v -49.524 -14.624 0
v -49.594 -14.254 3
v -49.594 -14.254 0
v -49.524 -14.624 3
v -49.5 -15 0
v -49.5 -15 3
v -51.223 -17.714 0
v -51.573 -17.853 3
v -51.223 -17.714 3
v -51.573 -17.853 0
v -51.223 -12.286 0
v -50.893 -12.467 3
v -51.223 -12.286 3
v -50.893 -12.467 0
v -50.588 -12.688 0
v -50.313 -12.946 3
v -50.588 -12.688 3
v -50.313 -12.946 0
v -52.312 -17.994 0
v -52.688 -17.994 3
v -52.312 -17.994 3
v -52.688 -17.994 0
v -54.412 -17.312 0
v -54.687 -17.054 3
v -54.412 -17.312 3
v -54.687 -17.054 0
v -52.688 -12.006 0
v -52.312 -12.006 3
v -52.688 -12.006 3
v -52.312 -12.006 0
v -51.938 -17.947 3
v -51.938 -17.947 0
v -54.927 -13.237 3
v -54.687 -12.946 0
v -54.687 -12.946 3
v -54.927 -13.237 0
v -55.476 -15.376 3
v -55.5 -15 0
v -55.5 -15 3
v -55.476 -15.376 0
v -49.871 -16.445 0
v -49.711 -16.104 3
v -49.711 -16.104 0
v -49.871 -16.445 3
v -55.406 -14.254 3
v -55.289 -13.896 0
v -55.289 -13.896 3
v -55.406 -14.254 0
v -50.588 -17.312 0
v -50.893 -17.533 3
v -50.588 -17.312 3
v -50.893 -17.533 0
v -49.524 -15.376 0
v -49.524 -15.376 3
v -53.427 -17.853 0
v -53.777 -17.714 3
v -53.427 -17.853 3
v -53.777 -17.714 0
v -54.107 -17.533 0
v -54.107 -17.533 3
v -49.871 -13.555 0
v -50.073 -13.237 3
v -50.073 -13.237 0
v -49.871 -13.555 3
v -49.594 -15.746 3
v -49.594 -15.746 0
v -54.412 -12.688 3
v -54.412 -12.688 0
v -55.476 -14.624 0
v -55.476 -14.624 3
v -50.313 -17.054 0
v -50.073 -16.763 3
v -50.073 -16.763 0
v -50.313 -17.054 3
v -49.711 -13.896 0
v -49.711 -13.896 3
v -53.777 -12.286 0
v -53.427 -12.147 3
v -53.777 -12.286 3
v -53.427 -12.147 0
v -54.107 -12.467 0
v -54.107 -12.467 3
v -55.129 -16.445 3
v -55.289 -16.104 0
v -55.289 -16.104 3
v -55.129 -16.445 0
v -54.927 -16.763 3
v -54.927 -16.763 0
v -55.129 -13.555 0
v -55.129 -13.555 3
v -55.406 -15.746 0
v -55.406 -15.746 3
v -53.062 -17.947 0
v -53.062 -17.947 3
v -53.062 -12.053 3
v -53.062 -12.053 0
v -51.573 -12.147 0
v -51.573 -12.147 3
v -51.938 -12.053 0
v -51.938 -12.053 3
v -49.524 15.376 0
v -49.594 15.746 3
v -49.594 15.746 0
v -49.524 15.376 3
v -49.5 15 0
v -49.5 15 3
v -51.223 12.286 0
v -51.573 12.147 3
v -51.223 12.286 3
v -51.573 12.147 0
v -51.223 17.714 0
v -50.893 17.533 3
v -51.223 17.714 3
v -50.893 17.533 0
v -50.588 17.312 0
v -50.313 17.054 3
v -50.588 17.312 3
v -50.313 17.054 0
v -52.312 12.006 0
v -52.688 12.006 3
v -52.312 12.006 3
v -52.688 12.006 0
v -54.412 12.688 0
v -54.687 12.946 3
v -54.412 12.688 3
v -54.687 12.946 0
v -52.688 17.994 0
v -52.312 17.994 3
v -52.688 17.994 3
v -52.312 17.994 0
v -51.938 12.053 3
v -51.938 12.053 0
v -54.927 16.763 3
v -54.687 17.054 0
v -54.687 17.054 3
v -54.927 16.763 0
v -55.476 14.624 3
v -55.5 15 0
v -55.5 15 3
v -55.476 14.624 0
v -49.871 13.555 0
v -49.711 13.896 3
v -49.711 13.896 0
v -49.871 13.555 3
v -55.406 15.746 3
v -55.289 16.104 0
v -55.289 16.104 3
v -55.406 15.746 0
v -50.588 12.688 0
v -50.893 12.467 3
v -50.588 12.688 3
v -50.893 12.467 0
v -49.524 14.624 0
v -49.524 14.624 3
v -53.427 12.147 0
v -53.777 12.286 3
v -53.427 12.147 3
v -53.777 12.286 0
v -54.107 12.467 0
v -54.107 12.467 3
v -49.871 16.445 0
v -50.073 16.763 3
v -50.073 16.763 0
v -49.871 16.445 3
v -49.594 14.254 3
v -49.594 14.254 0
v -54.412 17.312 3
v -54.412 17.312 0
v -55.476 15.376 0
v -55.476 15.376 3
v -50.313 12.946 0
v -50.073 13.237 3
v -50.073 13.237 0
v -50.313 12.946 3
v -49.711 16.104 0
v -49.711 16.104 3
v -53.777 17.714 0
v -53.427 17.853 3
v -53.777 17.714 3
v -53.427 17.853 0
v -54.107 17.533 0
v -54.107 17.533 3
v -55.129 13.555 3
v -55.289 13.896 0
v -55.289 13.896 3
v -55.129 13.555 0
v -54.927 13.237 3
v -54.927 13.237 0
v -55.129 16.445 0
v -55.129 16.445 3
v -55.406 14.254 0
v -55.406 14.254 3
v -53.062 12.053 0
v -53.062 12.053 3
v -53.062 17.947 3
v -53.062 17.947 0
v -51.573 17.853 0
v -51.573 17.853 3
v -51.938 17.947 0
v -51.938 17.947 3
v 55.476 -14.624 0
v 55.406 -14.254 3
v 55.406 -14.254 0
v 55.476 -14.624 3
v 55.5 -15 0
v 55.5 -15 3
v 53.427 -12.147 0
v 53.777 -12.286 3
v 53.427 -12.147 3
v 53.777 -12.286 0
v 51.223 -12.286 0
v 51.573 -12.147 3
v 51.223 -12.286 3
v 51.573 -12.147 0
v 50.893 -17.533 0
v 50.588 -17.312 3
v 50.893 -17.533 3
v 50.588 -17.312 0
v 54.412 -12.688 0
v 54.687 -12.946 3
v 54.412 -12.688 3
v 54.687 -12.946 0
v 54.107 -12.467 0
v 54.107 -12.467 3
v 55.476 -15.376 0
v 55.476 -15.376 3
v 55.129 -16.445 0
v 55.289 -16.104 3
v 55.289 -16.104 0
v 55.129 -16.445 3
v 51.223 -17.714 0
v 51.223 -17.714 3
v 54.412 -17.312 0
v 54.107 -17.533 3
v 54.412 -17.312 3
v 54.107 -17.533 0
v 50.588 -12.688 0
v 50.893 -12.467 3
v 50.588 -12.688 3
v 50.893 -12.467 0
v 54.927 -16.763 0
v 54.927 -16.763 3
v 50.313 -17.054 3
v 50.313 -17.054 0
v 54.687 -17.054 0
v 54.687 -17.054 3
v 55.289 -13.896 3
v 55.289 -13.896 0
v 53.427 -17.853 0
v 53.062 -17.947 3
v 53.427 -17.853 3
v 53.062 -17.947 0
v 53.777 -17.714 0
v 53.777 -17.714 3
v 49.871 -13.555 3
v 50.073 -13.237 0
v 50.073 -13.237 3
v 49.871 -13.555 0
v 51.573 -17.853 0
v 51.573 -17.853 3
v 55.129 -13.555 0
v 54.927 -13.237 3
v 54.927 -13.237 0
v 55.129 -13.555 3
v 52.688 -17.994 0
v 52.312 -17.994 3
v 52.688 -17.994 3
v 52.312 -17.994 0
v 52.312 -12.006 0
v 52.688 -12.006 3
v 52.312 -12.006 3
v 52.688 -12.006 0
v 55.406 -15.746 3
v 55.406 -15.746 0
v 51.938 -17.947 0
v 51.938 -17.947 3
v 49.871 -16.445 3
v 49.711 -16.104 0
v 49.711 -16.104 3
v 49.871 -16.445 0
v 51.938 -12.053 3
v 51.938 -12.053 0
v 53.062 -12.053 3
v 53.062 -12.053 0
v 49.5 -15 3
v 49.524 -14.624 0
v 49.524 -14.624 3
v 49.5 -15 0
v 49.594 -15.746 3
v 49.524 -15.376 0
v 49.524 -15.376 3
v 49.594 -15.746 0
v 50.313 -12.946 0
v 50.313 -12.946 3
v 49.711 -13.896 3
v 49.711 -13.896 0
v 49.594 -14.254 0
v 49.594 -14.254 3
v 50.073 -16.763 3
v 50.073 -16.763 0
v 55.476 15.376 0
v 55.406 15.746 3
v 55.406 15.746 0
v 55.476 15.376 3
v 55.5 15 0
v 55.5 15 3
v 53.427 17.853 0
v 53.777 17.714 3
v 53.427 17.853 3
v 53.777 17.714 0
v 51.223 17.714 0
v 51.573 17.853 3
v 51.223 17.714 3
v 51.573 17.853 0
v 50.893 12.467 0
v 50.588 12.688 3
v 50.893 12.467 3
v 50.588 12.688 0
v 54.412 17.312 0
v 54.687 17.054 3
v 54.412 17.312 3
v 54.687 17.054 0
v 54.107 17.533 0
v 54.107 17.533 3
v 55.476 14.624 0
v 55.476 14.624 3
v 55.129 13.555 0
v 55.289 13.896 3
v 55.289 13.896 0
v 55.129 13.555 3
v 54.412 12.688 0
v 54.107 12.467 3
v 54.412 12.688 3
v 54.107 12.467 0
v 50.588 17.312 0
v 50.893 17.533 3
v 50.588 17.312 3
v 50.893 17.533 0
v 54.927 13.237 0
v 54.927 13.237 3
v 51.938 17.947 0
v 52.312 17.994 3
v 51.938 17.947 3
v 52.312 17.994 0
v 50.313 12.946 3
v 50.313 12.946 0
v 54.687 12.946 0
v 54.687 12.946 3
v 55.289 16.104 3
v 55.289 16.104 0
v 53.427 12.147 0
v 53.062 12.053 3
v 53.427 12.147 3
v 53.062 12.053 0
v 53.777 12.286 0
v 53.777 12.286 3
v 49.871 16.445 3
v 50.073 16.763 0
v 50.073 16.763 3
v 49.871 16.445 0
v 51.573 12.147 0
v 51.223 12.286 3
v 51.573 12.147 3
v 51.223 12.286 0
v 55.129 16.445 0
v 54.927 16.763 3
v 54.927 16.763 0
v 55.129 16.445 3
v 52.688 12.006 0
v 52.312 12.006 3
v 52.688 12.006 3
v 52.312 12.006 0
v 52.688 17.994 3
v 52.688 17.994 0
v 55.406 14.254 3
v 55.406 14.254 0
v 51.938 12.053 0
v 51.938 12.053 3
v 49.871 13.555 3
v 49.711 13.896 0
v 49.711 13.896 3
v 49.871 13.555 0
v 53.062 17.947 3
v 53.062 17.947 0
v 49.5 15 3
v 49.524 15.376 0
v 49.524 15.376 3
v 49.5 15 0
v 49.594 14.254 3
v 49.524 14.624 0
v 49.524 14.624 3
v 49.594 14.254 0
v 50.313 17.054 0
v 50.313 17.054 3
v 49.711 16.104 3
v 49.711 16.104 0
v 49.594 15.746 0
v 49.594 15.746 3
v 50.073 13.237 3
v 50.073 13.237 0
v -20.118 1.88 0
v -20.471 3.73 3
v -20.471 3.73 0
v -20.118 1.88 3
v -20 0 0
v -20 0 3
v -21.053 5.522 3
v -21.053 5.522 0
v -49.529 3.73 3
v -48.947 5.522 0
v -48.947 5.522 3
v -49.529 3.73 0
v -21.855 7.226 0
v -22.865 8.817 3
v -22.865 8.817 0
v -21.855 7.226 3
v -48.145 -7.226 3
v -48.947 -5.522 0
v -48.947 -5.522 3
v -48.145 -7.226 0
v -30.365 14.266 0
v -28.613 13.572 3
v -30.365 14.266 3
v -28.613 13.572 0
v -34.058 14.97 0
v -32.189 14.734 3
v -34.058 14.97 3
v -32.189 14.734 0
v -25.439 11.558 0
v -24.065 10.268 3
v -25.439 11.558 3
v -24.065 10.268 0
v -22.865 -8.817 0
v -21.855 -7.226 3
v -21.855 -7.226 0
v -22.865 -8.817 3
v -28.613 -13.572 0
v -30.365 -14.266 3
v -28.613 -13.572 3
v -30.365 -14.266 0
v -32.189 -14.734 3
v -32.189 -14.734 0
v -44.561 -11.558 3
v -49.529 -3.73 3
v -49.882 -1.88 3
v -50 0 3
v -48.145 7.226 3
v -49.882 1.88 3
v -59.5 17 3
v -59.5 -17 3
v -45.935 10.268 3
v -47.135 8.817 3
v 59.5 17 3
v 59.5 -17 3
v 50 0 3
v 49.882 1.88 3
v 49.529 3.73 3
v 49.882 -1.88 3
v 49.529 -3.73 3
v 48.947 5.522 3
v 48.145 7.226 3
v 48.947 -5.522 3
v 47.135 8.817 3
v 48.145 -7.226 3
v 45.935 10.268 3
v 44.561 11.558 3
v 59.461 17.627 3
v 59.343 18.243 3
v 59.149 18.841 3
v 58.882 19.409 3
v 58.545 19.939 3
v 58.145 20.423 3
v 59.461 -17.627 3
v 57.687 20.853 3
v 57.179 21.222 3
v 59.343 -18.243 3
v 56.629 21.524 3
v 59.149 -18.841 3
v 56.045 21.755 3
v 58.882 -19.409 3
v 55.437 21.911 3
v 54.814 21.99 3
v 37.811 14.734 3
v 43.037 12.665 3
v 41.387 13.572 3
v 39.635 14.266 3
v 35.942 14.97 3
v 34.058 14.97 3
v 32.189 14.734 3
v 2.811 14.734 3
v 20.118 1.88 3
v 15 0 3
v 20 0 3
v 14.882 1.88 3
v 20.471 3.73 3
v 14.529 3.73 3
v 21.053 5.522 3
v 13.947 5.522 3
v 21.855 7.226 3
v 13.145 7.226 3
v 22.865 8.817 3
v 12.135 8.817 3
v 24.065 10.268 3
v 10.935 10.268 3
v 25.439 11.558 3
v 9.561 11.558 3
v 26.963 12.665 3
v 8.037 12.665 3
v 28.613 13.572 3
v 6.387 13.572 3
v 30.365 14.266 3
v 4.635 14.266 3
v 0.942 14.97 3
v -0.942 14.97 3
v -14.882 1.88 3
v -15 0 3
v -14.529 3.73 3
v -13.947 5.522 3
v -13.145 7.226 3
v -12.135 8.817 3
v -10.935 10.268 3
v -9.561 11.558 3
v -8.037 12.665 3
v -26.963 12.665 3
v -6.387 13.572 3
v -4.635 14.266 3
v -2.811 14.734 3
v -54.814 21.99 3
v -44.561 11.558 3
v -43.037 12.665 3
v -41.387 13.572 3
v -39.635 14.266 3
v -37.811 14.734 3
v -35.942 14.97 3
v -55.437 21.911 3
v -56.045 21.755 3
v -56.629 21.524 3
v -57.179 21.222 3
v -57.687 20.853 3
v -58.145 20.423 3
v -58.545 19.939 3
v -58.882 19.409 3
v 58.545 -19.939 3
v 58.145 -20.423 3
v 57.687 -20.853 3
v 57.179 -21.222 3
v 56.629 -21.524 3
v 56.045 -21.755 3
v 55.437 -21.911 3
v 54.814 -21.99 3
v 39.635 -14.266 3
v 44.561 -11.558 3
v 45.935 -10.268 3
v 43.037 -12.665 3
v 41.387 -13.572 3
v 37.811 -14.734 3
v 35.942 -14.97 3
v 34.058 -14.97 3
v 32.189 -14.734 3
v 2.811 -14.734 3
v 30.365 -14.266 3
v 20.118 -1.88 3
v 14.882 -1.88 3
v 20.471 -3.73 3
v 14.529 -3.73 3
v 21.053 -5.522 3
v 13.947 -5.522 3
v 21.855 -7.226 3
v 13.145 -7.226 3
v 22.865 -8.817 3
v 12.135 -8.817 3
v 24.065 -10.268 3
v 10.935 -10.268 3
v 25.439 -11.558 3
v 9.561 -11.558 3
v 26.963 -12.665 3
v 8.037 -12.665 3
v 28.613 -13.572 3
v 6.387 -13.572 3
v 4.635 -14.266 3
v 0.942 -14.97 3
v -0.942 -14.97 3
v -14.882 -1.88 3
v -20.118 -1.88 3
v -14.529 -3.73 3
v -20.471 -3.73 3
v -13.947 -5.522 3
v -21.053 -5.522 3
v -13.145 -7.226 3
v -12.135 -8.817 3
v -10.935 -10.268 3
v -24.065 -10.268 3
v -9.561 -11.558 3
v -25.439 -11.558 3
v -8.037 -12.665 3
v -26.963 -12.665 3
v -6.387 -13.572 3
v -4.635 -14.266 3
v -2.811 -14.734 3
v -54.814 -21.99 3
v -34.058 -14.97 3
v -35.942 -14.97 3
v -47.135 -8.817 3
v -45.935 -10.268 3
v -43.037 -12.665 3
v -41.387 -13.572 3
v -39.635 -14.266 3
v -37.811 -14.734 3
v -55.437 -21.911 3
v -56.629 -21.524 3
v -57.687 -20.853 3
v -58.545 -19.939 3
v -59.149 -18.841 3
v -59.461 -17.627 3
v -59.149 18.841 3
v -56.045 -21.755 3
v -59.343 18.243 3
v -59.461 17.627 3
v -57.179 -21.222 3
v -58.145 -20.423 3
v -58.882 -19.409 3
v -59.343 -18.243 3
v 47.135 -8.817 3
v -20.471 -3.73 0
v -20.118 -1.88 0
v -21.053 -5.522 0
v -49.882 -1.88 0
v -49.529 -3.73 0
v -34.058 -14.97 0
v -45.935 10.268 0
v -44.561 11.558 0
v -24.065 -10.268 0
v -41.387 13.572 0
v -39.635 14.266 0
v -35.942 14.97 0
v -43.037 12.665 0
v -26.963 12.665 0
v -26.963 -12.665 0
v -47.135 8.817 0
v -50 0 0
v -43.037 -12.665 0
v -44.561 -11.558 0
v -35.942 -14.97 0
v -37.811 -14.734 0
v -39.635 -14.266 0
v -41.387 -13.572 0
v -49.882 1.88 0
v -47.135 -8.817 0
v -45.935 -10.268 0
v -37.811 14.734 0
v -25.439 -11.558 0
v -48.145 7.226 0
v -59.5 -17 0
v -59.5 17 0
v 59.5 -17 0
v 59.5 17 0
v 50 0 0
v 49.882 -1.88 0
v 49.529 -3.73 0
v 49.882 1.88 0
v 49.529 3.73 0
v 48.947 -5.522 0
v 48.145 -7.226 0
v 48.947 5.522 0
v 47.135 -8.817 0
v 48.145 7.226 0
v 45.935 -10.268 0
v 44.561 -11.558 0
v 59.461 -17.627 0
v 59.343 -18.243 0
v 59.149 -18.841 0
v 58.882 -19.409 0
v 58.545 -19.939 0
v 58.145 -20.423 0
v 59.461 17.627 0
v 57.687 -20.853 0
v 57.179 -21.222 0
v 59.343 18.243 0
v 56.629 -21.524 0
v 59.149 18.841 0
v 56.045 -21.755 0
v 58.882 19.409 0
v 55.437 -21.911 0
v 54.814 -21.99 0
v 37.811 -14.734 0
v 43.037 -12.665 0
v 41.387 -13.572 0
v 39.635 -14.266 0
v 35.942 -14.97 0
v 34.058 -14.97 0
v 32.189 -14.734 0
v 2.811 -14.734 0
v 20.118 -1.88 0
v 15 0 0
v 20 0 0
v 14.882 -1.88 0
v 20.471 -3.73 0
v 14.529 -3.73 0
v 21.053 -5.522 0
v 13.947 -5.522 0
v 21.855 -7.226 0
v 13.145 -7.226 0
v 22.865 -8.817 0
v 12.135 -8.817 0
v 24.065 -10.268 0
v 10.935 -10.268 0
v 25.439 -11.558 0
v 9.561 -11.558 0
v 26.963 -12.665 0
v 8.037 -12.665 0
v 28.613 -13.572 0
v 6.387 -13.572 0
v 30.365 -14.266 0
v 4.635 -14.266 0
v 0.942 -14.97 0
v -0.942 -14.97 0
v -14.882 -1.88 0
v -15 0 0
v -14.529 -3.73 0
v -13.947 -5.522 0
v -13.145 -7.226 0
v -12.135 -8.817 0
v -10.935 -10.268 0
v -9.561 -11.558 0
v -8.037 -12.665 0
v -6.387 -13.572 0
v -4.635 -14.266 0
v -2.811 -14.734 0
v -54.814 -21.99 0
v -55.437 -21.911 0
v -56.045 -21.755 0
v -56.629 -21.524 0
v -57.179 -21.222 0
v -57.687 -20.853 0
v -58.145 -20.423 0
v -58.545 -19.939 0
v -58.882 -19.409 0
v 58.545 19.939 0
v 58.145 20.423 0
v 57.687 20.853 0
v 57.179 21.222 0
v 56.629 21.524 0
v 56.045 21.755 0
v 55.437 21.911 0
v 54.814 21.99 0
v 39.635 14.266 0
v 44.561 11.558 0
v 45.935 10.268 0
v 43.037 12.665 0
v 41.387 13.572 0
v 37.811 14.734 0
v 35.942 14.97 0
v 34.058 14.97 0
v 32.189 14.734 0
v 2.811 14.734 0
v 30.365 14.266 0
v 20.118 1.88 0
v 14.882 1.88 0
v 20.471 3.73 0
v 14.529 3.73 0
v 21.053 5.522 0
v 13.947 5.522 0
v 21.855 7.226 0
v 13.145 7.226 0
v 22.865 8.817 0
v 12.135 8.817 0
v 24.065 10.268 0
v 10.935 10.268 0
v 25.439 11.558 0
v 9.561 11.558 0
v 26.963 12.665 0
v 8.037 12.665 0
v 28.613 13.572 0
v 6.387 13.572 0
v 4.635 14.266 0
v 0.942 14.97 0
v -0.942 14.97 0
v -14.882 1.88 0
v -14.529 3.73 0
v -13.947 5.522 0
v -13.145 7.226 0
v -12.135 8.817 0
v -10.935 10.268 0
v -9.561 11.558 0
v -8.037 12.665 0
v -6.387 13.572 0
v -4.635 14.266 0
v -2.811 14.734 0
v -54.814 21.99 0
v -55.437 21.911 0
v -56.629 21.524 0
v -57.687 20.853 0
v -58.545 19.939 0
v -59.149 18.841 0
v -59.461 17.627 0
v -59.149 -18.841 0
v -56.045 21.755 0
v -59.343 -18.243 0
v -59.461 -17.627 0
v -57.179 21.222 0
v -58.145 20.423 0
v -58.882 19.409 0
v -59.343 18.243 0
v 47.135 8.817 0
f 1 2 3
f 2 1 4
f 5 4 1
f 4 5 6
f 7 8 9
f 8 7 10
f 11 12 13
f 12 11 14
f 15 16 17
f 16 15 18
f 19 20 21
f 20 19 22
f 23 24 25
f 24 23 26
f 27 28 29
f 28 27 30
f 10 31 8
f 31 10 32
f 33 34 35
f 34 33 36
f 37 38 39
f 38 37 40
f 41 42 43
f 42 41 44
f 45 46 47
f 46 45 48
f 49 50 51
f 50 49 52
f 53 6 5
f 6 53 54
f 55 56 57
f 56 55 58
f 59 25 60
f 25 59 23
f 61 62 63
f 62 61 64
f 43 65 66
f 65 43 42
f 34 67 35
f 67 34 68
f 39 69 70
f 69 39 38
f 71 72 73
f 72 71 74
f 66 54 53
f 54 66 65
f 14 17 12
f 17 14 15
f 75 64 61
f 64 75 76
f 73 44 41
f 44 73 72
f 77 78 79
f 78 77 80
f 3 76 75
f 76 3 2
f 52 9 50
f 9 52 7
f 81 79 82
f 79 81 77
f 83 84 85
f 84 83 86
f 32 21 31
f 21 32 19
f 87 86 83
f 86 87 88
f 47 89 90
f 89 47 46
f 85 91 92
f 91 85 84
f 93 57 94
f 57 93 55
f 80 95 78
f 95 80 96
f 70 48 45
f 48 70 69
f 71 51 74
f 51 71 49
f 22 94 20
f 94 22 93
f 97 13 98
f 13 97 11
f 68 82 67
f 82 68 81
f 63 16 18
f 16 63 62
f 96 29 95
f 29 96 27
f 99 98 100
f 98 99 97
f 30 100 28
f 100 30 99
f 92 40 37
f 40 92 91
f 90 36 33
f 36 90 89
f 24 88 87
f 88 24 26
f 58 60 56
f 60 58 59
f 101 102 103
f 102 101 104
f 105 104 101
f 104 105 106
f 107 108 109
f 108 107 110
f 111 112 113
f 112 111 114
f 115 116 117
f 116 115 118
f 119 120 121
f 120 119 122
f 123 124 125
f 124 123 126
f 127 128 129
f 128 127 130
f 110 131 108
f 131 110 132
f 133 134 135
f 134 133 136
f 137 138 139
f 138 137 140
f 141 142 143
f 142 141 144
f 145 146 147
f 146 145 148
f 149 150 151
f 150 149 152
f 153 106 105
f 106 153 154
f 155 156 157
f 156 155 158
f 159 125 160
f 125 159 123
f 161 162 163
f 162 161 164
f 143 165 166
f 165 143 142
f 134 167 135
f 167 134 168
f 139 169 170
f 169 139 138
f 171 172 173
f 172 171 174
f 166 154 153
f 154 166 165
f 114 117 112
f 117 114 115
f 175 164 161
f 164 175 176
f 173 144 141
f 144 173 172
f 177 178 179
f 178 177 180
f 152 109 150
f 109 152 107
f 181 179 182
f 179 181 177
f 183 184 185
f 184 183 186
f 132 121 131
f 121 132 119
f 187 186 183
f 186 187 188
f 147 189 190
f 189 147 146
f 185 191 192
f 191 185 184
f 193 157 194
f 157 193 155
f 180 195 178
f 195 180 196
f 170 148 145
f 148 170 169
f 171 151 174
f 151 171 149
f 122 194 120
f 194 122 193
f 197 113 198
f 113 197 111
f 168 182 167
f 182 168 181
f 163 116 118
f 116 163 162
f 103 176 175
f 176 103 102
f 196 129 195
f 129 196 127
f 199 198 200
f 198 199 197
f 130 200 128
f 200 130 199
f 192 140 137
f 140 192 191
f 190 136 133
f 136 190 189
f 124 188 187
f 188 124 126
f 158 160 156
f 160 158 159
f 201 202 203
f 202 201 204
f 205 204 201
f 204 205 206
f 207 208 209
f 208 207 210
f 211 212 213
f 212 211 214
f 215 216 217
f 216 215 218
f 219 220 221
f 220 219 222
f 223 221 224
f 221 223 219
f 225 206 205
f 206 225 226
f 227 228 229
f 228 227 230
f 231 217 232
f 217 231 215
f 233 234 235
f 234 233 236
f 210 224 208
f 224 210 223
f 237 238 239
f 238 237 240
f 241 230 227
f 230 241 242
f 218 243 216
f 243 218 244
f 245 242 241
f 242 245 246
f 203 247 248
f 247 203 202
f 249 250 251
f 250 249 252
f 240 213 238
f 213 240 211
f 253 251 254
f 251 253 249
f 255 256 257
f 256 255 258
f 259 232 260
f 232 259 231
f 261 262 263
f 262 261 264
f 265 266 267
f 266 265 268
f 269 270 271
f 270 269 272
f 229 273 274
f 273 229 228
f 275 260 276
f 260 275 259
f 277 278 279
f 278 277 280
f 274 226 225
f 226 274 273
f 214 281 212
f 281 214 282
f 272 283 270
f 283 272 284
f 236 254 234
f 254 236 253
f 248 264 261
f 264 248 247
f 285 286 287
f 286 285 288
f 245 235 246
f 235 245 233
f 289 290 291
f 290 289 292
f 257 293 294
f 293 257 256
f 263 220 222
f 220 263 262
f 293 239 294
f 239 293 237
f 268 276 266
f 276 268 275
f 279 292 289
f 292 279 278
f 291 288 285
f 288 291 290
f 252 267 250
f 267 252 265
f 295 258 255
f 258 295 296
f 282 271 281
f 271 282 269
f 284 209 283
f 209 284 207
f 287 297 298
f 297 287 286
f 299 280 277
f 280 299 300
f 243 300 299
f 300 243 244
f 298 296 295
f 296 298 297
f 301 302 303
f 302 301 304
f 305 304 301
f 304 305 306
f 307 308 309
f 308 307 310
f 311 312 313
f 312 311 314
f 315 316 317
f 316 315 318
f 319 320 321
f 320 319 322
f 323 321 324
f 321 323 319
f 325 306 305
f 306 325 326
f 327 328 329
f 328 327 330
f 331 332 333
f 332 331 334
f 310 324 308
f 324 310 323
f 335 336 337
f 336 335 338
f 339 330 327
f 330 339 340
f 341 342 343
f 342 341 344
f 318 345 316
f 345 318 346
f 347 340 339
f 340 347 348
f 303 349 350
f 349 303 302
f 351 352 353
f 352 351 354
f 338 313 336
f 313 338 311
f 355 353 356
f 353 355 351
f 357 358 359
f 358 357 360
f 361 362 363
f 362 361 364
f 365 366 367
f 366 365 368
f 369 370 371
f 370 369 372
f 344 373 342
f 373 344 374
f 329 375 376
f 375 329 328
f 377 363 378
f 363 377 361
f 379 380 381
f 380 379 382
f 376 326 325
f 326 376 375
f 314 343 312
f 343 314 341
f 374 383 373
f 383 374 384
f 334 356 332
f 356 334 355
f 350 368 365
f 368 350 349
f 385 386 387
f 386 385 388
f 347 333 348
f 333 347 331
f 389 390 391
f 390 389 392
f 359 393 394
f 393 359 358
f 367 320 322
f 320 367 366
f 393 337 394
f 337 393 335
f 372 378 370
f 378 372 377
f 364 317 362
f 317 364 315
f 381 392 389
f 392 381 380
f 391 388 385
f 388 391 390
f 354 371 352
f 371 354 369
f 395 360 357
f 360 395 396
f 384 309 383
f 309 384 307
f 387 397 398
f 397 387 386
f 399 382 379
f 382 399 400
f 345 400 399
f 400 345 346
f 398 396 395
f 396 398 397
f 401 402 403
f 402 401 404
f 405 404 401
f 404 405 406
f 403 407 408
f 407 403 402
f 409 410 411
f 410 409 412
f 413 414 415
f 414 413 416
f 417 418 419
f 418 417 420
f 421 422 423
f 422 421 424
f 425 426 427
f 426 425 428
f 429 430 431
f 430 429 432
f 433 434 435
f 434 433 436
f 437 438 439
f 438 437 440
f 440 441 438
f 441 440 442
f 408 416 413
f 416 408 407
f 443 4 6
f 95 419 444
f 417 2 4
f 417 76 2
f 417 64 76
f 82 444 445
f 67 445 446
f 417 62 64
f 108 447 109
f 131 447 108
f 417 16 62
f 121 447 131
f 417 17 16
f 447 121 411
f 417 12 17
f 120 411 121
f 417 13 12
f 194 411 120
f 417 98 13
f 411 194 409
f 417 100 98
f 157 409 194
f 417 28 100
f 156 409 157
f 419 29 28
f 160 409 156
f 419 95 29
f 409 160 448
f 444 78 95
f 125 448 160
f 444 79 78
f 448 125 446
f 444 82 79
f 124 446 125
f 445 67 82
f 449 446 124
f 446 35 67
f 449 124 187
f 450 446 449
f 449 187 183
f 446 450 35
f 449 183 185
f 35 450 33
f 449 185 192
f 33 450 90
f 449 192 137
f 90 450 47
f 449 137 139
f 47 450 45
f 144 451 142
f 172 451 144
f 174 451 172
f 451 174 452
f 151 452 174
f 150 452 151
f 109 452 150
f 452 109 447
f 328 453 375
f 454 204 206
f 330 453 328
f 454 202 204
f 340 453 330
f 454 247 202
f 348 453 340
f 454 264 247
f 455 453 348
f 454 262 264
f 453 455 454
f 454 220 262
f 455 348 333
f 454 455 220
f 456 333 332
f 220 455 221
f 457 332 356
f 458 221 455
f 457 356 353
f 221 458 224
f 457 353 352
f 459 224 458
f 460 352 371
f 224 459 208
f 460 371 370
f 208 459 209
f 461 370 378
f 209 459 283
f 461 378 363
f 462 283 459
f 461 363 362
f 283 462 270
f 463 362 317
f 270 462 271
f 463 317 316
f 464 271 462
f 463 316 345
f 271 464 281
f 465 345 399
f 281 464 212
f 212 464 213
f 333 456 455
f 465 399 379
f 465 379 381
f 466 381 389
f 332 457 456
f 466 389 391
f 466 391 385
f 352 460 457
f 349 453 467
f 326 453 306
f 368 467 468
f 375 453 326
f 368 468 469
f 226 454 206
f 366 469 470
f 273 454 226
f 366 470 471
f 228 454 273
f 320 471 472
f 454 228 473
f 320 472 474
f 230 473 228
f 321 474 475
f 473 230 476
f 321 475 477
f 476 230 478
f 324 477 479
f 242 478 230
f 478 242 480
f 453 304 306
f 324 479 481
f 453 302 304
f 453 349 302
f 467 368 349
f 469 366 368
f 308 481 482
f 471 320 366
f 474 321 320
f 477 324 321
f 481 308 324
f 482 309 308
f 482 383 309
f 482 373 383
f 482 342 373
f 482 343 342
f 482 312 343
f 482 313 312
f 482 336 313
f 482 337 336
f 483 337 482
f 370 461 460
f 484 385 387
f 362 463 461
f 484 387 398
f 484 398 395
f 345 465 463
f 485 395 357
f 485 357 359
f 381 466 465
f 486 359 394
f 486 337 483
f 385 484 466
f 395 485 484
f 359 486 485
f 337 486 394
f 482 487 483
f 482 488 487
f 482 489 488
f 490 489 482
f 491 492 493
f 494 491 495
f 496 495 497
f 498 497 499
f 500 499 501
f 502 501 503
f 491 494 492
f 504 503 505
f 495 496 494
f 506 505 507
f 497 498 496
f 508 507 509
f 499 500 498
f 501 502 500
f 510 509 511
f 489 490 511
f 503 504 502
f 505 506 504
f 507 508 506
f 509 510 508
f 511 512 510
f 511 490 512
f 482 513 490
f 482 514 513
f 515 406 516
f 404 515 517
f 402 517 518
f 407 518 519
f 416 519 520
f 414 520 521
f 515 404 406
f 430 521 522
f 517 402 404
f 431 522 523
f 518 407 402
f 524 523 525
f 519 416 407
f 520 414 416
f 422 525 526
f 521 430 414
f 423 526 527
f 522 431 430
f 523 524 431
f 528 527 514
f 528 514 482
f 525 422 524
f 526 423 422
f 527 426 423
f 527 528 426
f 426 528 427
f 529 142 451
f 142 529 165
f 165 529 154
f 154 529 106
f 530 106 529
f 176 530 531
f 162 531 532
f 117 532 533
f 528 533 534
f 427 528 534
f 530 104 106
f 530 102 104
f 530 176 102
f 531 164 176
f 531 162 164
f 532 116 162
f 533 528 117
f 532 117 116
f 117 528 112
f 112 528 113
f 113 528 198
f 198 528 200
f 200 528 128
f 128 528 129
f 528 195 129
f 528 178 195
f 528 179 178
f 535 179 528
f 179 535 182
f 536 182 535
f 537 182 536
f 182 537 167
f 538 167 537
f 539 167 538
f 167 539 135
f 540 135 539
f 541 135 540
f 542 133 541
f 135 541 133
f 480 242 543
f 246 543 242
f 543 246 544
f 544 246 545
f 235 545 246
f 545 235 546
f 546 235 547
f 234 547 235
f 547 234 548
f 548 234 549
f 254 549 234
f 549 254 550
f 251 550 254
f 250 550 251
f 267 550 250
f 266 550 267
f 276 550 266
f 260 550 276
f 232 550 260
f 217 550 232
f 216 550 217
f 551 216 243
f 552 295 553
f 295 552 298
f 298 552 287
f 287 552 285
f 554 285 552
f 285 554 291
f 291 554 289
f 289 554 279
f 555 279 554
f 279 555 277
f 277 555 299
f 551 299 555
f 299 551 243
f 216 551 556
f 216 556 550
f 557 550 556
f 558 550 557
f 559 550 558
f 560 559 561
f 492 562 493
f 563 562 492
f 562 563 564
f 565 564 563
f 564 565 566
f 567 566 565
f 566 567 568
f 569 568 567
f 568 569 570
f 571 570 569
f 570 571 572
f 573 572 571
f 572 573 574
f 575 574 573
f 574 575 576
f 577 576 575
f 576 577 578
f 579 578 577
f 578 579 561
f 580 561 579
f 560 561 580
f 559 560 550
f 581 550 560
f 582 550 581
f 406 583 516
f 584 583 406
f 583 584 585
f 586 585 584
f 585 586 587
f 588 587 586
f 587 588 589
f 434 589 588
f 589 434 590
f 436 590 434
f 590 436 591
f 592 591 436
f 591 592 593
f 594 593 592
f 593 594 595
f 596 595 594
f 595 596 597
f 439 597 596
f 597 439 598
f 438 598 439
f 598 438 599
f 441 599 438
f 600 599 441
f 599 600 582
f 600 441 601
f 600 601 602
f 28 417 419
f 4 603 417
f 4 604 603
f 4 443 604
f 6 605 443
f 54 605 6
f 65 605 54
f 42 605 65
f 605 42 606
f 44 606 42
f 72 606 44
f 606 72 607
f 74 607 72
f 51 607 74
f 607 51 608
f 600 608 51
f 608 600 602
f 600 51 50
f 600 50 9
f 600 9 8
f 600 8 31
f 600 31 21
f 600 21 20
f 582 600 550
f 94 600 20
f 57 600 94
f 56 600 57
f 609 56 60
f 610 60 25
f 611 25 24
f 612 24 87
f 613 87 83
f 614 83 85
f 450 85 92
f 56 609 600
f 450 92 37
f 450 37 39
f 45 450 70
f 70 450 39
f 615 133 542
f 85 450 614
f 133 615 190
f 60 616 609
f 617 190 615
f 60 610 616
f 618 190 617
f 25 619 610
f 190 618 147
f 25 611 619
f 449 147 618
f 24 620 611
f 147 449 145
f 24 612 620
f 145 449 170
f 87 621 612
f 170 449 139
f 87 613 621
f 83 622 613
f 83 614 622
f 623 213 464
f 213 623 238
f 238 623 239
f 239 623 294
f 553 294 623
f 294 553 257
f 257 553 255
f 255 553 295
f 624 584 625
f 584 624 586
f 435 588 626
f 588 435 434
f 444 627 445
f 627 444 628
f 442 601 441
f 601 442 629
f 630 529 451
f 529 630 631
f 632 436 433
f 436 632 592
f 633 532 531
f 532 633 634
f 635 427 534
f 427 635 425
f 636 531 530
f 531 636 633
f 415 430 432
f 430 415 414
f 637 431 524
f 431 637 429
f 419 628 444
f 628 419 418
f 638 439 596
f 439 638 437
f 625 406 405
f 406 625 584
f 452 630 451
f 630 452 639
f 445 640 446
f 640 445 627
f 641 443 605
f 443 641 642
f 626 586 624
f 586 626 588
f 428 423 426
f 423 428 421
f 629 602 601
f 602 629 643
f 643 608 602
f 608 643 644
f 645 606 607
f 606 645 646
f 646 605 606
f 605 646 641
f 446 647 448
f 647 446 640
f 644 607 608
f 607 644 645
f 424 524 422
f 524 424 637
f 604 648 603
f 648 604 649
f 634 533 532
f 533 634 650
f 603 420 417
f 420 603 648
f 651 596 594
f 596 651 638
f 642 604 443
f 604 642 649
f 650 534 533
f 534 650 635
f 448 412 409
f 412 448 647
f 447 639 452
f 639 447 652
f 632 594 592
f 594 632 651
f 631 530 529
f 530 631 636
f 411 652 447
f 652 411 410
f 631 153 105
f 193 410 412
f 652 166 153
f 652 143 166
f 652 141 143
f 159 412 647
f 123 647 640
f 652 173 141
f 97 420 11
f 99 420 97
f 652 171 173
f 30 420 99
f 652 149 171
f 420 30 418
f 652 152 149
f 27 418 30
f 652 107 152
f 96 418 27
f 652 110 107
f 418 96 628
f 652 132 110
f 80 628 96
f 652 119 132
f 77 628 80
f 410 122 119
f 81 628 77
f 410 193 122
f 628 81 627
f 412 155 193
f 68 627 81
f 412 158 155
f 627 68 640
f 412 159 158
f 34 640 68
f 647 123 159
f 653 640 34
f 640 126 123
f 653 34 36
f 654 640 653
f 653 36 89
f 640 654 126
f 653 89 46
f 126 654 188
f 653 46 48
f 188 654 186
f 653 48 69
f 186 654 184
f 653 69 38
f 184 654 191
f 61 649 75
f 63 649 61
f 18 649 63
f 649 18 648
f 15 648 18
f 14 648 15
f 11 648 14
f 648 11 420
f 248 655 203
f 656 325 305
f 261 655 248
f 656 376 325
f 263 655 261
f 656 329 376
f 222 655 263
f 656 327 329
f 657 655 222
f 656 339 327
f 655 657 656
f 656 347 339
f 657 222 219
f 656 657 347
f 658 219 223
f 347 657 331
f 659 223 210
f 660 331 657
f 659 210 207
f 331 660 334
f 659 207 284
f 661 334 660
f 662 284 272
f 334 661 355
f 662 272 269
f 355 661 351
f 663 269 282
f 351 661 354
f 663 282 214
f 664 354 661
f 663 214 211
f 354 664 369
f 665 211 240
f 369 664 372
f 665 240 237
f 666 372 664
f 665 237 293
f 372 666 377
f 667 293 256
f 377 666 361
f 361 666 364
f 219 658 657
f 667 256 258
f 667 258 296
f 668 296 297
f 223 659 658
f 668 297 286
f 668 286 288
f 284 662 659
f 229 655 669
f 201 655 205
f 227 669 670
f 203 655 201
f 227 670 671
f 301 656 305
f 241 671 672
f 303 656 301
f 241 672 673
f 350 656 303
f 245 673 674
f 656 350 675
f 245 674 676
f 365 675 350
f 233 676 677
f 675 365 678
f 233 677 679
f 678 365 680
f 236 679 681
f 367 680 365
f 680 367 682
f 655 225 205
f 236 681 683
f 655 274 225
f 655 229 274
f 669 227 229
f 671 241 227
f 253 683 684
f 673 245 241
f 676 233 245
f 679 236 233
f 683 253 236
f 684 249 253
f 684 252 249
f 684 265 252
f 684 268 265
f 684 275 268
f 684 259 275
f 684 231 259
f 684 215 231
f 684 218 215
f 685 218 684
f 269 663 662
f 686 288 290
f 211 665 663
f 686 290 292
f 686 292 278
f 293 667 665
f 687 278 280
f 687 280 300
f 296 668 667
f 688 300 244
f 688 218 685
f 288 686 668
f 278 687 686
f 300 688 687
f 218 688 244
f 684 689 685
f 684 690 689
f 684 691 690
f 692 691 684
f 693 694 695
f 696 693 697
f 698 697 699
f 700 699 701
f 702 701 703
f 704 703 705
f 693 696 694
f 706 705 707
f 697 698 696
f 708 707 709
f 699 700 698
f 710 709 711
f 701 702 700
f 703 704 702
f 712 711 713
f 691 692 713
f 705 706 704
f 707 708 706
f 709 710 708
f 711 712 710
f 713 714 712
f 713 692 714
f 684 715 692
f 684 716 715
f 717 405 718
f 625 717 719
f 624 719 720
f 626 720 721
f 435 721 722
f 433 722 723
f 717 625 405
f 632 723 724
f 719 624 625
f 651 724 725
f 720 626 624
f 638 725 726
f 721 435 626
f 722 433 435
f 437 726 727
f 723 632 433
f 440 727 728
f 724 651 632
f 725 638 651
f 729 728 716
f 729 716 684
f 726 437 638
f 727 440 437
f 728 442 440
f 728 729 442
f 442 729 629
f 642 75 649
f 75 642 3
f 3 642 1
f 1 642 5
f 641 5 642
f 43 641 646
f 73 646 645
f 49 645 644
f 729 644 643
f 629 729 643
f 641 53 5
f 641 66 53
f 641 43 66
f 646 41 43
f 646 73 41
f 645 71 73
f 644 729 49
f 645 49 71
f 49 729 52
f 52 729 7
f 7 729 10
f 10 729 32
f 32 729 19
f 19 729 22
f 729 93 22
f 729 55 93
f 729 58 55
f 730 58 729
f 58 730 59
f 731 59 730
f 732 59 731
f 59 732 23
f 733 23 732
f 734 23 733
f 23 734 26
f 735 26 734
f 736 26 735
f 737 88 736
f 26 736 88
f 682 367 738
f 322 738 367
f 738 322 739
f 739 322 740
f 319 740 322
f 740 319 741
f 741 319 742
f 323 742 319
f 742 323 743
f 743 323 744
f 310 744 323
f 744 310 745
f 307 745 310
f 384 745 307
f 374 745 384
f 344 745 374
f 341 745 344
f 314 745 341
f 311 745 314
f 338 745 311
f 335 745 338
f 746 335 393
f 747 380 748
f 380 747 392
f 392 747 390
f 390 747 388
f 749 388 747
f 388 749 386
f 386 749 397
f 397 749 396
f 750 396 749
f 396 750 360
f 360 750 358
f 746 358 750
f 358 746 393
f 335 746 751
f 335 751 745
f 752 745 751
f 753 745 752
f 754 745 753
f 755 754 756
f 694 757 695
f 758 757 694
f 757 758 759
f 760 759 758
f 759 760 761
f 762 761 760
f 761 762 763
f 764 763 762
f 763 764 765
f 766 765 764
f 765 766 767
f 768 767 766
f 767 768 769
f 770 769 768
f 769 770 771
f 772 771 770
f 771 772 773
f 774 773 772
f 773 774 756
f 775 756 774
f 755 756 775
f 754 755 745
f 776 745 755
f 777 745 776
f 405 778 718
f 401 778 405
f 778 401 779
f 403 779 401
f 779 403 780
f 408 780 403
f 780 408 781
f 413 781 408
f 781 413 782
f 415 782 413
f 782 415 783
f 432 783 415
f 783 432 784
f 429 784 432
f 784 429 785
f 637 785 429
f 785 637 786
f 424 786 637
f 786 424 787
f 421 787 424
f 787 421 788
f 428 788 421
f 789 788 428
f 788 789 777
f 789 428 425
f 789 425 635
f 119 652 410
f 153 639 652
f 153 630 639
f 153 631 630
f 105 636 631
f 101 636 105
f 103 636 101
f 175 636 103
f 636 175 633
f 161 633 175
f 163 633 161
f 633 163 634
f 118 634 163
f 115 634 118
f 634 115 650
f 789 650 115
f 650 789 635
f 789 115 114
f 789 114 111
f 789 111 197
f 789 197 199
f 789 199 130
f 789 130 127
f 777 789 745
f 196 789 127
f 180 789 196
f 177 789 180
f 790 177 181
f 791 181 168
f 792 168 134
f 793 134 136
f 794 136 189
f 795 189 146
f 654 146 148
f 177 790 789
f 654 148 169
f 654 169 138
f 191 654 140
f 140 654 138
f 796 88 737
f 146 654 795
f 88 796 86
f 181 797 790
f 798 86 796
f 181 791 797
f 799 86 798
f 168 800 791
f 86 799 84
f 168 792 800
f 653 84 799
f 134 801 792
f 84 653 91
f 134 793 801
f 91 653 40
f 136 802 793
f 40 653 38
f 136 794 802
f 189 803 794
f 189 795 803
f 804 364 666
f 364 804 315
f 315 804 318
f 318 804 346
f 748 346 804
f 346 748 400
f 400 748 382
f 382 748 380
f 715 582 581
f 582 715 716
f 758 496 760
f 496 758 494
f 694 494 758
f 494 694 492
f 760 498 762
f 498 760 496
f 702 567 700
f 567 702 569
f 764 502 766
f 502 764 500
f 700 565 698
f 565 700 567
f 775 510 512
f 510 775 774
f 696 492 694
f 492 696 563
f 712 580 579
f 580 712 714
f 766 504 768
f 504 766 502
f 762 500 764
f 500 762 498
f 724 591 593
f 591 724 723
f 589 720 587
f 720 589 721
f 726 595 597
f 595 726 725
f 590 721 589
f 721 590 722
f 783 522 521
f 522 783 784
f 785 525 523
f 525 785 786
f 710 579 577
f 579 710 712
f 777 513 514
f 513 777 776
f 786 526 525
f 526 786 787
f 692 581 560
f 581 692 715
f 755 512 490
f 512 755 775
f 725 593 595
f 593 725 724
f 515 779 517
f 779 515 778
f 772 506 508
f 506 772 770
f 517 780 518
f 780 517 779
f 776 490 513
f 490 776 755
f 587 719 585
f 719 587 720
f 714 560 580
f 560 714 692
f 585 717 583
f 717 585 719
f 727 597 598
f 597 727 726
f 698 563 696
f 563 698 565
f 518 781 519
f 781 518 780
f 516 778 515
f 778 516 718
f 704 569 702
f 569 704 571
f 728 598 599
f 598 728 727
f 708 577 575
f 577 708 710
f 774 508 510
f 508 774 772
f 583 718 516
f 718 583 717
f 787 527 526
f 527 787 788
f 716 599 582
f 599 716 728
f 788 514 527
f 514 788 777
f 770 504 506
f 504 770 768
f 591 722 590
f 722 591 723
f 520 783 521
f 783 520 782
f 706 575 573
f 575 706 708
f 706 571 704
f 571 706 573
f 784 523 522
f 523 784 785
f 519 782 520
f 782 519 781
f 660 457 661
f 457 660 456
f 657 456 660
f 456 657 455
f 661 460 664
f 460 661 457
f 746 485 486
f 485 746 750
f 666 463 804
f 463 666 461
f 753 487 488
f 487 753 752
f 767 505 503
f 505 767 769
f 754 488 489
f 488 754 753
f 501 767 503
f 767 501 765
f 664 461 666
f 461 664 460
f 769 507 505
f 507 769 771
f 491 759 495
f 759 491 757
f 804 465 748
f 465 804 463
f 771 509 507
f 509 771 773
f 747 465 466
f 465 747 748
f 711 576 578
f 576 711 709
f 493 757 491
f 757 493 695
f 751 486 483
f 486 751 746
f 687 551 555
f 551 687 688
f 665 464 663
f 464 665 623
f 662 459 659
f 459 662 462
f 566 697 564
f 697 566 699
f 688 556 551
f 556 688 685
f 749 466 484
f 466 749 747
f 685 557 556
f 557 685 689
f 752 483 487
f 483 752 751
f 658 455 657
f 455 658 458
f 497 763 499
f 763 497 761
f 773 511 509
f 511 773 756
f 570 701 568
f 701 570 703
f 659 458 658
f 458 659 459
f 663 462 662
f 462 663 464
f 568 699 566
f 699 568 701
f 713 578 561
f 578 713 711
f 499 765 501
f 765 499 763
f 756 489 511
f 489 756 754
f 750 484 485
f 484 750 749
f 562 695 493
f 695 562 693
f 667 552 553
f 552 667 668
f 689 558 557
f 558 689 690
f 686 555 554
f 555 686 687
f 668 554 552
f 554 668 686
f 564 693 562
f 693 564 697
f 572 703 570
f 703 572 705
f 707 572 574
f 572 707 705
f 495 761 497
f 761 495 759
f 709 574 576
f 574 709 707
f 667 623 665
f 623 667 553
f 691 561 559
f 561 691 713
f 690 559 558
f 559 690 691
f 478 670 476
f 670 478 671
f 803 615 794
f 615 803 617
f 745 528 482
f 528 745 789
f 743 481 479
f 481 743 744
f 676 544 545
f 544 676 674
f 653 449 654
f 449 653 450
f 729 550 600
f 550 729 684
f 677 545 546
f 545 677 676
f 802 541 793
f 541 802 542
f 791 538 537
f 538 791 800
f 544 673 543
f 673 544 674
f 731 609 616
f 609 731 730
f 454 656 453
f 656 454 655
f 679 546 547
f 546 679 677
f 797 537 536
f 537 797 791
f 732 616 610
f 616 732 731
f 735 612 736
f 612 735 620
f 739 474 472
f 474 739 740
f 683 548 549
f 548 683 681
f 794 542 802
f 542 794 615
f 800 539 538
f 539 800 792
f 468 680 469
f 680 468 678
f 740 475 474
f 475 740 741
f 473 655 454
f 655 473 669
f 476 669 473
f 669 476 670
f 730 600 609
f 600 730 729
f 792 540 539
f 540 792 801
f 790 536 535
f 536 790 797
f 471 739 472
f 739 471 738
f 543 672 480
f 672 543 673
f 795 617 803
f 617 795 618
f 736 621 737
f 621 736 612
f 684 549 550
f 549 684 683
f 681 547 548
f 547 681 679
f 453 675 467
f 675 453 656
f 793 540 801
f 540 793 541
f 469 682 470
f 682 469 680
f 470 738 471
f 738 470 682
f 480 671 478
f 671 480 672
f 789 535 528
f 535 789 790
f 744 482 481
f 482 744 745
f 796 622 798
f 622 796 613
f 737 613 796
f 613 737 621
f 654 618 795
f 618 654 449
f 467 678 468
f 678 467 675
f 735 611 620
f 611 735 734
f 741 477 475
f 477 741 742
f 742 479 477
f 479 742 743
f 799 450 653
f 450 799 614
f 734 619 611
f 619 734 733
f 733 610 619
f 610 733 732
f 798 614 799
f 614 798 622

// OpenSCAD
$fn = 50;

difference() {
	union() {
		hull() {
			translate(v = [-54.5, 17.0, 0]) {
				cylinder(h = 3, r = 5);
			}
			translate(v = [54.5, 17.0, 0]) {
				cylinder(h = 3, r = 5);
			}
			translate(v = [-54.5, -17.0, 0]) {
				cylinder(h = 3, r = 5);
			}
			translate(v = [54.5, -17.0, 0]) {
				cylinder(h = 3, r = 5);
			}
		}
	}
	union() {
		translate(v = [-52.5, -15.0, -100.0]) {
			cylinder(h = 200, r = 3.0);
		}
		translate(v = [-52.5, 15.0, -100.0]) {
			cylinder(h = 200, r = 3.0);
		}
		translate(v = [52.5, -15.0, -100.0]) {
			cylinder(h = 200, r = 3.0);
		}
		translate(v = [52.5, 15.0, -100.0]) {
			cylinder(h = 200, r = 3.0);
		}
		translate(v = [-52.5, -15.0, -100.0]) {
			cylinder(h = 200, r = 1.5);
		}
		translate(v = [-52.5, 15.0, -100.0]) {
			cylinder(h = 200, r = 1.5);
		}
		translate(v = [52.5, -15.0, -100.0]) {
			cylinder(h = 200, r = 1.5);
		}
		translate(v = [52.5, 15.0, -100.0]) {
			cylinder(h = 200, r = 1.5);
		}
		translate(v = [-35.0, 0, 0.0]) {
			cylinder(h = 3, r = 15.0);
		}
		cylinder(h = 3, r = 15.0);
		translate(v = [35.0, 0, 0.0]) {
			cylinder(h = 3, r = 15.0);
		}
	}
}
